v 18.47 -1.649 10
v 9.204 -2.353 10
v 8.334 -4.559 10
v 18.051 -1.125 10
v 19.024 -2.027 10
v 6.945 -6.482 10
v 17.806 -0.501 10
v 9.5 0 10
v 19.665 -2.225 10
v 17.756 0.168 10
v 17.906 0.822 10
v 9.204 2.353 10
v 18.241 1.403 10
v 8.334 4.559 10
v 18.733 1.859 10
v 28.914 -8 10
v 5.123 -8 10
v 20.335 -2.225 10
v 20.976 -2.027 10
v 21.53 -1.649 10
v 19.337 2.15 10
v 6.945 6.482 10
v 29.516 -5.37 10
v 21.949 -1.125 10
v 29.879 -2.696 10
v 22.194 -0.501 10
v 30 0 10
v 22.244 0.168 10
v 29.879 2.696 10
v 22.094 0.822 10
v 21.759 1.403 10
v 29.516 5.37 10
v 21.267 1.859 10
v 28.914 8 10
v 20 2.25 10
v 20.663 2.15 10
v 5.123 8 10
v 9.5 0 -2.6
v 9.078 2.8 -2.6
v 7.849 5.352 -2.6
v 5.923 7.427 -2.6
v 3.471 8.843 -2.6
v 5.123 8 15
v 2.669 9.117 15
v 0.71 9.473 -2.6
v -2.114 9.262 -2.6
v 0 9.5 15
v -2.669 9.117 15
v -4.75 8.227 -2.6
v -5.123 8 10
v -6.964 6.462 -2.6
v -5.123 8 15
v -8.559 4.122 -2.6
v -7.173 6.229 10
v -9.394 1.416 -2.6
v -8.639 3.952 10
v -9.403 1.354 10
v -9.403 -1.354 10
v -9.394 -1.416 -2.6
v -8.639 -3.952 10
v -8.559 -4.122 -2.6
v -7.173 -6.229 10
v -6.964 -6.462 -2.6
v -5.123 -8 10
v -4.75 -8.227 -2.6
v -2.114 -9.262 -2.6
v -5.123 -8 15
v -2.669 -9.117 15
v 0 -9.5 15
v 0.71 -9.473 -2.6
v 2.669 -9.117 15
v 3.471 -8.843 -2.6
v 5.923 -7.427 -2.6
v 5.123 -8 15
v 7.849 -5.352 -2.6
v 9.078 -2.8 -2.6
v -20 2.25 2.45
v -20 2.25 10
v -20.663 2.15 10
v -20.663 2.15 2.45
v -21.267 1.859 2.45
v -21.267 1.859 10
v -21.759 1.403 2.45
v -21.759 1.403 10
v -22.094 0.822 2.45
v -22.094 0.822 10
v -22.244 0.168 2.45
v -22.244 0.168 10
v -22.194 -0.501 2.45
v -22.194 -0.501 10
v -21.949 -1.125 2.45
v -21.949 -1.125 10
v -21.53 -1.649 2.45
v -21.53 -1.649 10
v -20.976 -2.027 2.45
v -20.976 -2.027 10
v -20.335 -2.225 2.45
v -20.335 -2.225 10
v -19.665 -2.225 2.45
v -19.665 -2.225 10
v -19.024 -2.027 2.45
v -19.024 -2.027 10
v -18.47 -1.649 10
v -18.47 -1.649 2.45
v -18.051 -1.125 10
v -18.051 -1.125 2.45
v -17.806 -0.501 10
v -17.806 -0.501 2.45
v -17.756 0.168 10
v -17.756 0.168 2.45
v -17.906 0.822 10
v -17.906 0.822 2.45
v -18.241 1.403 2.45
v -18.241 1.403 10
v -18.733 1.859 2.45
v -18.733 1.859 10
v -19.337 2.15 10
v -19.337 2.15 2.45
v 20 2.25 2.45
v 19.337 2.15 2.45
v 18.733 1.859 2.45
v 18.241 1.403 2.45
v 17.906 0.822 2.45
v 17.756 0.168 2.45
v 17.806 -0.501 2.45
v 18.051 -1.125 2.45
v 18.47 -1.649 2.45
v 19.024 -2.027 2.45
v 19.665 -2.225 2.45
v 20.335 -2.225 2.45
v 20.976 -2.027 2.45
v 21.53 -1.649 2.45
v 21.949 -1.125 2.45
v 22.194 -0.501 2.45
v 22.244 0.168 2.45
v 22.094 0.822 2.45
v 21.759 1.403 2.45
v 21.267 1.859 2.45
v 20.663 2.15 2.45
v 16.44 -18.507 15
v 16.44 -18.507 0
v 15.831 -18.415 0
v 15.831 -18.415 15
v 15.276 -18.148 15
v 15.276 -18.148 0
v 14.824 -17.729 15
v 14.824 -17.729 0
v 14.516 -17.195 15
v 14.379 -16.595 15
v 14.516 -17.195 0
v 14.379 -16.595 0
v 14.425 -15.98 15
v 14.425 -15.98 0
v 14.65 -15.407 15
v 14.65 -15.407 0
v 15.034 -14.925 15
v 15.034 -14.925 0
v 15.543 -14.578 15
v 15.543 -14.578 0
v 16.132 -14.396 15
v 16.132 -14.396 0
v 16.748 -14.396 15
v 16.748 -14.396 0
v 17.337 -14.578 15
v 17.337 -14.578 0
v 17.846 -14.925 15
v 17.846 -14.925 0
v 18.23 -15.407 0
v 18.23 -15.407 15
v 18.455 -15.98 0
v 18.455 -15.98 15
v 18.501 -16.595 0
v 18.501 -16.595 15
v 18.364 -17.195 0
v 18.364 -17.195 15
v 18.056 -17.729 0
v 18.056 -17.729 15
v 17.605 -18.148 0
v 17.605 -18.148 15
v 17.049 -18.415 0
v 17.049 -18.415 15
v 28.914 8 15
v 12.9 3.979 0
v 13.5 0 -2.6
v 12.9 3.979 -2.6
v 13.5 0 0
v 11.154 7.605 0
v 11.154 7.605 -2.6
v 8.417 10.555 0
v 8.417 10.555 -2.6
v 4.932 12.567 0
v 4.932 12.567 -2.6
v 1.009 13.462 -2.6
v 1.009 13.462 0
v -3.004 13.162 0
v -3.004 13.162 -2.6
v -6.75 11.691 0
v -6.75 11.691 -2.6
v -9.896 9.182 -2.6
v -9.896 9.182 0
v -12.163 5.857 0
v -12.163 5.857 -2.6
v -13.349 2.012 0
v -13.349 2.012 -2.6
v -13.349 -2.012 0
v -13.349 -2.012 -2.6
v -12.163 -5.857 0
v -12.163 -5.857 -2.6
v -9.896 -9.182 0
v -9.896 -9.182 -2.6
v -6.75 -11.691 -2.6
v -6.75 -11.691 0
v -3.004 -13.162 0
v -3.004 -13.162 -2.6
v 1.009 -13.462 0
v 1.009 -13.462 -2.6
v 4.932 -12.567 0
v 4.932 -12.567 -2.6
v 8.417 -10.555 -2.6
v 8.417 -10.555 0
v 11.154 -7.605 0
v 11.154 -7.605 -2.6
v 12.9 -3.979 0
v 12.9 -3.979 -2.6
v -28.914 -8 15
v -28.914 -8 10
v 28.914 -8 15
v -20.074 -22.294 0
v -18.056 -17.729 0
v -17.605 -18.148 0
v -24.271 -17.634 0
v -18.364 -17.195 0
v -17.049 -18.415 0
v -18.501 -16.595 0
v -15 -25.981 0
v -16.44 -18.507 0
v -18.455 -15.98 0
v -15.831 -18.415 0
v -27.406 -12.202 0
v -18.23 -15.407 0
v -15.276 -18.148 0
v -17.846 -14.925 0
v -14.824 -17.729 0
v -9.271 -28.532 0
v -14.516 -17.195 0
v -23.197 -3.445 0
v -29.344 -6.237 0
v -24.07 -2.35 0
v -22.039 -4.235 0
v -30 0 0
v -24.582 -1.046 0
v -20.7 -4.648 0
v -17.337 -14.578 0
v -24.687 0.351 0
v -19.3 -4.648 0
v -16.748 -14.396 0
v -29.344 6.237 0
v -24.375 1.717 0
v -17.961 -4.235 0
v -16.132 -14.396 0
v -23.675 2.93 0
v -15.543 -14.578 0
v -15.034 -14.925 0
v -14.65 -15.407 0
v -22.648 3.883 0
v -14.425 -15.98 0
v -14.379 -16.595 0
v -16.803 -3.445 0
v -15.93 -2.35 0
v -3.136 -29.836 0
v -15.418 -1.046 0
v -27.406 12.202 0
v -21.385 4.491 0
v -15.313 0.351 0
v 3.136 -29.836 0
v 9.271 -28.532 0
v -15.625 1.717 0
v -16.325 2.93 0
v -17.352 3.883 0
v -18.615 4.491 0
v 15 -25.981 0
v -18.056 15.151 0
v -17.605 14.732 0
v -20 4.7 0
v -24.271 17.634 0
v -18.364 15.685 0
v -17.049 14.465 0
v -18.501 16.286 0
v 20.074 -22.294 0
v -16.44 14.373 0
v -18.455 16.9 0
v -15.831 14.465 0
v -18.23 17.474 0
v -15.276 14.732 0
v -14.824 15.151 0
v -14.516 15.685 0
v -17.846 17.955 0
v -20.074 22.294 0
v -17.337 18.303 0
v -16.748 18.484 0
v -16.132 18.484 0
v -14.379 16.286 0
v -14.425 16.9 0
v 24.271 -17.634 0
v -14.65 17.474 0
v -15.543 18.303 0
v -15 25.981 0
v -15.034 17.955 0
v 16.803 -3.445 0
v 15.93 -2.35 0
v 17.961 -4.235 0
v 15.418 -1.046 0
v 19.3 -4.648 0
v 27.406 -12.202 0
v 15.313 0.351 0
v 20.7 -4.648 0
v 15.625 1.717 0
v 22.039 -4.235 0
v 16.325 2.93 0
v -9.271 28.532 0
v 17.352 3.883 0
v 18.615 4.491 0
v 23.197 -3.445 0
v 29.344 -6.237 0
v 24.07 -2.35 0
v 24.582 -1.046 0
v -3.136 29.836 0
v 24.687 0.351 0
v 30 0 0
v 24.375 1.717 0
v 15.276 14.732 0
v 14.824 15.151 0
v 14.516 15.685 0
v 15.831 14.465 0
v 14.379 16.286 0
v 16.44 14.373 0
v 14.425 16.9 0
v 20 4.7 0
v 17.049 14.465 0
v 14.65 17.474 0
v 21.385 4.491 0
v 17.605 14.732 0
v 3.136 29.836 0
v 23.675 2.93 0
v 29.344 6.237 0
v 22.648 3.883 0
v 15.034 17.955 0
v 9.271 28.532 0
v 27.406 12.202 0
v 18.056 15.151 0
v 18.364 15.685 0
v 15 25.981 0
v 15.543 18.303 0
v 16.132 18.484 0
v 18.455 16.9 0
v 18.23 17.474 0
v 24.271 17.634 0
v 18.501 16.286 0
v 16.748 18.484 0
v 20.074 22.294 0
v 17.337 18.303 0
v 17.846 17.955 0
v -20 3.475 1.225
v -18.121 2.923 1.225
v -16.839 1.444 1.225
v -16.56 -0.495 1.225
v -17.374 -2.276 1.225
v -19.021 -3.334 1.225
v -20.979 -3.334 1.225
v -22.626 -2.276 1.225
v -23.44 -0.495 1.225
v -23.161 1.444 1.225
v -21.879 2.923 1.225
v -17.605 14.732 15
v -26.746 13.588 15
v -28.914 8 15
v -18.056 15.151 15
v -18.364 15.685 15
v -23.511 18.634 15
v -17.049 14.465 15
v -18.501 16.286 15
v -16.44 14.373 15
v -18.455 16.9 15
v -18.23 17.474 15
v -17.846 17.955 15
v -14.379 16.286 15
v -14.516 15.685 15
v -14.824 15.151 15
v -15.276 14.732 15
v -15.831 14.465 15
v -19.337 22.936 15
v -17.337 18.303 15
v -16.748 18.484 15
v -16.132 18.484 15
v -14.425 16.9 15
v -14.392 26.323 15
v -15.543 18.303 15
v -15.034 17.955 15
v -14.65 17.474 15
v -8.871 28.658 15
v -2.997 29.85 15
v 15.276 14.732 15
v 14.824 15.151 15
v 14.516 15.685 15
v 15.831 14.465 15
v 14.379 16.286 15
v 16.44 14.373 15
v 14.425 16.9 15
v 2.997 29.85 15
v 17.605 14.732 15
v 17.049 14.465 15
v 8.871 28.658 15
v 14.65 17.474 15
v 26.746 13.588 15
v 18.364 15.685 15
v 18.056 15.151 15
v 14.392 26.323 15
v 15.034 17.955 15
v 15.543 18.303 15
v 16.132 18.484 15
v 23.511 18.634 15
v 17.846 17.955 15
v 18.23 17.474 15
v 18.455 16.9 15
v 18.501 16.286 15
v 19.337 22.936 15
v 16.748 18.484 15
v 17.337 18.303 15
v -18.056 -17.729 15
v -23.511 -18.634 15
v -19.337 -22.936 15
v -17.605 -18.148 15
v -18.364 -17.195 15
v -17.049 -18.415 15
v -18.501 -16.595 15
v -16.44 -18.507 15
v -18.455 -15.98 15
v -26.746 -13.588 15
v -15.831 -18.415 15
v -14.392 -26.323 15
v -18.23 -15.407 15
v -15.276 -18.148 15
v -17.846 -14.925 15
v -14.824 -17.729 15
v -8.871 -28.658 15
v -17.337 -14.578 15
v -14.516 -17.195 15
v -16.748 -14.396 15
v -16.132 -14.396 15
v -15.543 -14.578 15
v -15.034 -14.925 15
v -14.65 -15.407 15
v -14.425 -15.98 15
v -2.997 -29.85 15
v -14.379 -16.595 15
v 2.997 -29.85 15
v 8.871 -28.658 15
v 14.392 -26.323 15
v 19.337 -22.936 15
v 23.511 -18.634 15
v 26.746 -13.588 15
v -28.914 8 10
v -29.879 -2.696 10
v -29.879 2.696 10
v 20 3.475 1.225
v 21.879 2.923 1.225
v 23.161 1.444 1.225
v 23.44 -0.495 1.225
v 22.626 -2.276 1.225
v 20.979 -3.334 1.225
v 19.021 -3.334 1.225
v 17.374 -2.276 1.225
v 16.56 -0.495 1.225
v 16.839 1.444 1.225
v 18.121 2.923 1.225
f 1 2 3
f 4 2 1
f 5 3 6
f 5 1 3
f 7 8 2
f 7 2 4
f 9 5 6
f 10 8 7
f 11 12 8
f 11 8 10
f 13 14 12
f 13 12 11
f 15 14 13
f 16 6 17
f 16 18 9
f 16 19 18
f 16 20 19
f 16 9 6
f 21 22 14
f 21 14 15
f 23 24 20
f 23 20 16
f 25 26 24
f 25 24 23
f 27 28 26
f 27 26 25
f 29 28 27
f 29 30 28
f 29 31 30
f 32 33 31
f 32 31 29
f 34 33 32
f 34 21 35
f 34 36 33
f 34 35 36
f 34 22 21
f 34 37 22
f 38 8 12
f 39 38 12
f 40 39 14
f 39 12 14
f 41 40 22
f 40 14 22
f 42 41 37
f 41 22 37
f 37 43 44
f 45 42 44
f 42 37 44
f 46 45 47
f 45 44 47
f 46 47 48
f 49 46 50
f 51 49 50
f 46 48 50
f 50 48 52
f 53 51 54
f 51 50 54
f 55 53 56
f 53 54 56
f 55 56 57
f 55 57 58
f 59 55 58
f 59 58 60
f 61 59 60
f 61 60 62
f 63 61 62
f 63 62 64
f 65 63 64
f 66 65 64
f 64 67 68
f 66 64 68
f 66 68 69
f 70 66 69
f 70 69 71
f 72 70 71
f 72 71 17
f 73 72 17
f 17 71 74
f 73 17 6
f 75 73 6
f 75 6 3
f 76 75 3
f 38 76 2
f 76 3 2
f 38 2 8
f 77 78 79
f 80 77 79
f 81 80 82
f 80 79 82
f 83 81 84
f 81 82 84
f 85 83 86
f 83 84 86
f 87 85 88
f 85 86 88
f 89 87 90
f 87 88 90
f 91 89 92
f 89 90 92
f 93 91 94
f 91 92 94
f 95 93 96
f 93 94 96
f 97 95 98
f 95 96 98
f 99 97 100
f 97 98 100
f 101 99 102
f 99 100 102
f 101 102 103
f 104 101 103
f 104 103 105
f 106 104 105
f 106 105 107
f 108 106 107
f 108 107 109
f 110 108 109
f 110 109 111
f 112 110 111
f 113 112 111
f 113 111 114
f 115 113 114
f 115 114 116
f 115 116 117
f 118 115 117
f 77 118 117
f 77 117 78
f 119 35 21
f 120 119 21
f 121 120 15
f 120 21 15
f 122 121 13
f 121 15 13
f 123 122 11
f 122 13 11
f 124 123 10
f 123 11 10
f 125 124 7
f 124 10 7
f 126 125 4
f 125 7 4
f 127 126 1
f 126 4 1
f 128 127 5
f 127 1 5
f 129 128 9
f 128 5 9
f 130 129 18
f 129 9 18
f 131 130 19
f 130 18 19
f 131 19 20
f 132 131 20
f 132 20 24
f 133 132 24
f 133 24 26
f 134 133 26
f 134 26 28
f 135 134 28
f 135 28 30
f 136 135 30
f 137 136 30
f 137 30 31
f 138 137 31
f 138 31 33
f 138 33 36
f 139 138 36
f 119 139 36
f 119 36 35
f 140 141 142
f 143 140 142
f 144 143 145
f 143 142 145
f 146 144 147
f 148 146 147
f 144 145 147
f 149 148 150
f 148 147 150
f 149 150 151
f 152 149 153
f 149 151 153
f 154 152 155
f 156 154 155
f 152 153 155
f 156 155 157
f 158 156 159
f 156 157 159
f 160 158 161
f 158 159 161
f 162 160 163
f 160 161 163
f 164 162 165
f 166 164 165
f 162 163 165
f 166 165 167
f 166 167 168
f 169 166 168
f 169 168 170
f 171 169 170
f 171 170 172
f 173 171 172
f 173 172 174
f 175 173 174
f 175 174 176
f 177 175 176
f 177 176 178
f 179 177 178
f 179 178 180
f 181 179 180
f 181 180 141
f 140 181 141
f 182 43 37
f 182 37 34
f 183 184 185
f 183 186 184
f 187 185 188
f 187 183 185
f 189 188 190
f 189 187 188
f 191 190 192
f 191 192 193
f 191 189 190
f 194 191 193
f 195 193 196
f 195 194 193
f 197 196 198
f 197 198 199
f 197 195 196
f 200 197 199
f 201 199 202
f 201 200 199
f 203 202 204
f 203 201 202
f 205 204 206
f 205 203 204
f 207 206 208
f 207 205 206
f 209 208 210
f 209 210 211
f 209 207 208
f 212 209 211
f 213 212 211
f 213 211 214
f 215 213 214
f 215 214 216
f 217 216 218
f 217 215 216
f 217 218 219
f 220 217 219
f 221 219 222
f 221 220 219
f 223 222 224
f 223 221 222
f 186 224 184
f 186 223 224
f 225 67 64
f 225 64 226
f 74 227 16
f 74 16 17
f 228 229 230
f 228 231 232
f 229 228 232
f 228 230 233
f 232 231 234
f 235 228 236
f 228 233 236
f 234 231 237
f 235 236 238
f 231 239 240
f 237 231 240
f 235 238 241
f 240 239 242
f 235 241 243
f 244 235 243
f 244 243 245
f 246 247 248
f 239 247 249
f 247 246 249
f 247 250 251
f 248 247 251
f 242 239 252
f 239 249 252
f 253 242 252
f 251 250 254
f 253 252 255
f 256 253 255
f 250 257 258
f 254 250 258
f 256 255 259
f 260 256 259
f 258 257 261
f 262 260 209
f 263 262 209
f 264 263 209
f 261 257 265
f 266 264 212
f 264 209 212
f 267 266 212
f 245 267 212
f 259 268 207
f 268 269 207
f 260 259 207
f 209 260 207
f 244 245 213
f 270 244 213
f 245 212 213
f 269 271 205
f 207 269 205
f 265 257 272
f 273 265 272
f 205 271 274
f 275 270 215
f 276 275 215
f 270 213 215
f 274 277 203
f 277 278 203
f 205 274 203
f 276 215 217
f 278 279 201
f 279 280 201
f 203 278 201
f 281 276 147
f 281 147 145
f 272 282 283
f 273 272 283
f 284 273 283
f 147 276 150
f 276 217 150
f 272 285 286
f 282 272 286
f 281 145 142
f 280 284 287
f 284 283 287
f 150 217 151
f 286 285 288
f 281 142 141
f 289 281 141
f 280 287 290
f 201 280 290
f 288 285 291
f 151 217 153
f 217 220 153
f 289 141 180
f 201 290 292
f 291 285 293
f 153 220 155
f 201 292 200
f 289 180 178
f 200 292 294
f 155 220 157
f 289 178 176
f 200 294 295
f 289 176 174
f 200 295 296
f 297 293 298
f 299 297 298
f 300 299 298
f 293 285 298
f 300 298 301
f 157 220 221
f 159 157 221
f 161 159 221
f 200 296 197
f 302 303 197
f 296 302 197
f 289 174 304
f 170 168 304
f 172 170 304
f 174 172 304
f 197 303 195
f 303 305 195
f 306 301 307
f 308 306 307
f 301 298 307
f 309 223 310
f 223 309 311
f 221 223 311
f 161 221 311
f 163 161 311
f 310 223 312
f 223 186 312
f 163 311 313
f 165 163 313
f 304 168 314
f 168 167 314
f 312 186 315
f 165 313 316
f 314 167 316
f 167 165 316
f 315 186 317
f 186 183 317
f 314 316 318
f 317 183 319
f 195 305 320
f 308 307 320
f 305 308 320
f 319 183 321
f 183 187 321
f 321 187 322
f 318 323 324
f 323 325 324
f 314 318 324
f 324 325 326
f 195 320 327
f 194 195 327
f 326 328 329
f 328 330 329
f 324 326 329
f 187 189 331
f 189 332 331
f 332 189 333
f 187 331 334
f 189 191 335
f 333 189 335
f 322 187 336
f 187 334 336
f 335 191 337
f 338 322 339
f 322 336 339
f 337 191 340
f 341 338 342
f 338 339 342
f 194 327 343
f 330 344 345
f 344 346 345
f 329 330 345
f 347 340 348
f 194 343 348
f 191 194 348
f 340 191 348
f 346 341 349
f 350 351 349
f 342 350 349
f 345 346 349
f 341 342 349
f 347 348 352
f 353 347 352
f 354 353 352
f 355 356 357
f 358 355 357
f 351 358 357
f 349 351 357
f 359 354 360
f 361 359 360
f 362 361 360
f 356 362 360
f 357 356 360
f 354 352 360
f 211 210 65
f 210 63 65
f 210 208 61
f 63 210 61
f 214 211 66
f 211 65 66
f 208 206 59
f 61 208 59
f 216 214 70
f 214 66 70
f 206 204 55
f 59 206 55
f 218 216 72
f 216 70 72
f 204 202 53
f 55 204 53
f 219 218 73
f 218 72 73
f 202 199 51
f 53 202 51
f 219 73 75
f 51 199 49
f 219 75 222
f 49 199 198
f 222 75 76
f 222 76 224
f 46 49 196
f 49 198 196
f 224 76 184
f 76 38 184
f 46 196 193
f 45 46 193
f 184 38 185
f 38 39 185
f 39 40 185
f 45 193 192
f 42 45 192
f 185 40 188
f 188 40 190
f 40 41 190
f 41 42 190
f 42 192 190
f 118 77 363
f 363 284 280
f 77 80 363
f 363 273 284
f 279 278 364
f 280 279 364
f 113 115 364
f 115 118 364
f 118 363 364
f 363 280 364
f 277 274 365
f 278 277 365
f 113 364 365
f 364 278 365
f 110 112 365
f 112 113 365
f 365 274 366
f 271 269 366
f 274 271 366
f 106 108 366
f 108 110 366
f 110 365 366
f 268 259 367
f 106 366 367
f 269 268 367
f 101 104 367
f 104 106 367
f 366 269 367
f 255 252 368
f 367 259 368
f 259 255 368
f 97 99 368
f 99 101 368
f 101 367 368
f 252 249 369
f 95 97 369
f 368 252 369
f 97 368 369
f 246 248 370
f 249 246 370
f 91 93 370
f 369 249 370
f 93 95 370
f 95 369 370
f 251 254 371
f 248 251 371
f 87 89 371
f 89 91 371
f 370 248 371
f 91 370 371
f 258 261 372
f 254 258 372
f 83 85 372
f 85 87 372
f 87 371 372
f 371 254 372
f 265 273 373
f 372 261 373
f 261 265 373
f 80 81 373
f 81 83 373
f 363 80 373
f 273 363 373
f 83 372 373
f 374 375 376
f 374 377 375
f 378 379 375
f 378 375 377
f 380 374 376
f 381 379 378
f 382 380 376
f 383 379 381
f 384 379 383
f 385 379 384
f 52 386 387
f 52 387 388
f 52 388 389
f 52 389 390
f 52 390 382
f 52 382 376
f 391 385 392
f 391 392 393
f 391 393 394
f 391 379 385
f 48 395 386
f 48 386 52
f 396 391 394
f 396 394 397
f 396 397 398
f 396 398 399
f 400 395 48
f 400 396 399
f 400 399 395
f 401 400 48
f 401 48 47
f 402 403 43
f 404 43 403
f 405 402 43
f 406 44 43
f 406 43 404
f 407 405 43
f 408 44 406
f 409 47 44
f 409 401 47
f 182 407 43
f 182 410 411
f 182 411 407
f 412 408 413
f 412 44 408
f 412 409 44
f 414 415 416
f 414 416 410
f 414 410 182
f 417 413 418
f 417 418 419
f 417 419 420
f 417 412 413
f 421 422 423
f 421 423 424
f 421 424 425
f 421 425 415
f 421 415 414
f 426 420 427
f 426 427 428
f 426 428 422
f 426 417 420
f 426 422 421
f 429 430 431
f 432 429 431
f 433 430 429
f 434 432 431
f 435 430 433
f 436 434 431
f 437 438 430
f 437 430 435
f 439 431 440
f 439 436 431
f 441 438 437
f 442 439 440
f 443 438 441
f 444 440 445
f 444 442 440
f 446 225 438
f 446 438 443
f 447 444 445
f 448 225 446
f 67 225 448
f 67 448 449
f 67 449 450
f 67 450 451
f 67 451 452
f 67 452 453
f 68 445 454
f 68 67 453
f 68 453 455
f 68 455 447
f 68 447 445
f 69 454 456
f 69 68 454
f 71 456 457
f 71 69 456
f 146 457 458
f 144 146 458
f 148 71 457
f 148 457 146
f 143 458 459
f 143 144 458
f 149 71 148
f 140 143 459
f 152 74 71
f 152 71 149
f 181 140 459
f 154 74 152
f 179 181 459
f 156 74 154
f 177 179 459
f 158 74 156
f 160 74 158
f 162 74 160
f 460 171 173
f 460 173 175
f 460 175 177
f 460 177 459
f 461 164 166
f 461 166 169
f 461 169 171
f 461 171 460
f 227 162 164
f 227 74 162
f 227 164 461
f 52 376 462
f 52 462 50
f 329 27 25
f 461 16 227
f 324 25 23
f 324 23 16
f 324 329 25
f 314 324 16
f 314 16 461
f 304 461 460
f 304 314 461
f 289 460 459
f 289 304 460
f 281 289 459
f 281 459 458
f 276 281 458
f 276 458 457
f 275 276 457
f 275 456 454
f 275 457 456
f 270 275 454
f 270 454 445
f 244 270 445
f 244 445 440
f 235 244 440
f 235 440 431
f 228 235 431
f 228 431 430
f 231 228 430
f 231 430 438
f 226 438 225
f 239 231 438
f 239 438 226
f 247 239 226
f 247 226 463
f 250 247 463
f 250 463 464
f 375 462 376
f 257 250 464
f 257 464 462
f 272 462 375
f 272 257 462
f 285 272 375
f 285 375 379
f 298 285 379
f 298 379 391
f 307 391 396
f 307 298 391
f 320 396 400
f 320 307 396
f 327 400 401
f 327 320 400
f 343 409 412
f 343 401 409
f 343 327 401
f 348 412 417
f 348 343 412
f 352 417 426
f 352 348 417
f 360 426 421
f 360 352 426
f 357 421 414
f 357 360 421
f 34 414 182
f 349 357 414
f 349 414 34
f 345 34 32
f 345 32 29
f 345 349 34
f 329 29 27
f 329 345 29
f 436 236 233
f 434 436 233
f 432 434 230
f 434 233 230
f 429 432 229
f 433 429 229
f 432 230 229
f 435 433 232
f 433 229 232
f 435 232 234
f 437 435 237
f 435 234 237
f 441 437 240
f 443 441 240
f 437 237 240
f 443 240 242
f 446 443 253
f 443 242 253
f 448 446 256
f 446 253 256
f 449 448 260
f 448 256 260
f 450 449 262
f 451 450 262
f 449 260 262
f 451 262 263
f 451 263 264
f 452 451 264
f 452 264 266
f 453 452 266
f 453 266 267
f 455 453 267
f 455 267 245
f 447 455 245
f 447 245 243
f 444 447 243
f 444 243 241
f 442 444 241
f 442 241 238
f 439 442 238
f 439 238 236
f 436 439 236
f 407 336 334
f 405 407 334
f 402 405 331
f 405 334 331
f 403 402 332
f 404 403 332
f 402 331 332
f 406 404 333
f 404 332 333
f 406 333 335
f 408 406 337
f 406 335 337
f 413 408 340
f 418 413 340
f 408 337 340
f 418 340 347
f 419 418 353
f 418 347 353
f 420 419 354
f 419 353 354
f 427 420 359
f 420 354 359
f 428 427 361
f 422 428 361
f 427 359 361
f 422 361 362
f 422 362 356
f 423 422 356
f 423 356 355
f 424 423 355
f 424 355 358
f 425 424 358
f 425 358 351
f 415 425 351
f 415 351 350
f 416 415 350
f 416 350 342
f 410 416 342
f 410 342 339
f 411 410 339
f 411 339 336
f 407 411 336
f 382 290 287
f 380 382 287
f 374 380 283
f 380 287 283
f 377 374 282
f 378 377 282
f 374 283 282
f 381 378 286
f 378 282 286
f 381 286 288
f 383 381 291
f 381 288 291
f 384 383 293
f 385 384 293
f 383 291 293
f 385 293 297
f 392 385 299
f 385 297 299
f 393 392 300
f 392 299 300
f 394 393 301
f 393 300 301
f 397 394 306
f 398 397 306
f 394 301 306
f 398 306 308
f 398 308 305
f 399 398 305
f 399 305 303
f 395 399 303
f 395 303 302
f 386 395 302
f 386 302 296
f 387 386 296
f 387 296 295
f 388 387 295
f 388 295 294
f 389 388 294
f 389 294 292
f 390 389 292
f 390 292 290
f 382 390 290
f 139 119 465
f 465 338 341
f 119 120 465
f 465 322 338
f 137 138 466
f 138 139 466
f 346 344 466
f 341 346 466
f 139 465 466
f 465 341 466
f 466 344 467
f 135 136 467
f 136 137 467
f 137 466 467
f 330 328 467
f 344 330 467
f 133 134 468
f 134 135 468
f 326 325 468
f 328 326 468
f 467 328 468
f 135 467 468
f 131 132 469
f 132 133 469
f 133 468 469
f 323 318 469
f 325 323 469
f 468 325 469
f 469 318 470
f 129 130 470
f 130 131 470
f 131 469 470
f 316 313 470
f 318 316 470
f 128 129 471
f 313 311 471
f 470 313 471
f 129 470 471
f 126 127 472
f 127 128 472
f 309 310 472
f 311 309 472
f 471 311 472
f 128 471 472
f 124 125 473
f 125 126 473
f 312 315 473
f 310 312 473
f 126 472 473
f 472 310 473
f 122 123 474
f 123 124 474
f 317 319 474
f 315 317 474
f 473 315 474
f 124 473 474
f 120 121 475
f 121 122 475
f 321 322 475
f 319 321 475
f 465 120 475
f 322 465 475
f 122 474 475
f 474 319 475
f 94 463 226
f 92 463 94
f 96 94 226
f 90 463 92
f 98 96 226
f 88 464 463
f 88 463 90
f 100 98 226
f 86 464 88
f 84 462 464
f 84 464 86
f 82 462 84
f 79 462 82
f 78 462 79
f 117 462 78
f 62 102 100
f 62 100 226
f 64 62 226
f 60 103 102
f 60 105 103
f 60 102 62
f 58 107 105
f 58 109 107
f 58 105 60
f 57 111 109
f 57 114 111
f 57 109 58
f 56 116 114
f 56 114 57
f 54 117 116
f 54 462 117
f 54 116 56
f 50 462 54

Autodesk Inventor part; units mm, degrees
ref_plane "Arbeitsebene3" through (0, 0, 50) normal (0, 0, 1) x (1, 0, 0)
ref_plane "Arbeitsebene4" through (0, 0, 130) normal (0, 0, 1) x (1, 0, 0)
sketch "Skizze1" plane through (0, 0, 0) normal (0, 0, 1) x (1, 0, 0)
  circle A0 centre (0, 0) radius 30
  circle A1 centre (0, 0) radius 13.5
  circle A2 centre (0, 0) radius 9.5
  circle A3 centre (0, 0) radius 23.25 construction
  line L0 (0, 0) -> (16.4402, 16.4402) construction
  line L1 (0, 0) -> (0, 30) construction
  point P0 (-16.4402, 16.4402)
  point P1 (-16.4402, -16.4402)
  point P2 (16.4402, -16.4402)
  dimension "d3" = 30
  dimension "d4" = 46.5
  dimension "d0" = 4
  dimension "d1" = 27
  dimension "d7" = 360
  dimension "d99" = 45
extrude "Extrusion1" add sketch "Skizze1" along normal blind 15 contours A0 | A1
extrude "Extrusion2" add sketch "Skizze1" against normal blind 2.6 contours A1
sketch "Skizze2" plane through (0, 0, 15) normal (0, 0, 1) x (1, 0, 0)
  point P0 (0, 0)
  point P1 (16.4402, 16.4402)
  point P2 (16.4402, -16.4402)
  point P3 (-16.4402, -16.4402)
  point P4 (-16.4402, 16.4402)
hole "Bohrung1" at (16.4402, 16.4402, 15) at (16.4402, -16.4402, 15) at (-16.4402, -16.4402, 15) at (-16.4402, 16.4402, 15) direction (0, 0, -1) diameter 4.134 end through all thread size "M5x0.8" class "6H" standard "ISO Metric profile"
ref_plane "Arbeitsebene1" through (0, 0, 10) normal (0, 0, 1) x (1, 0, 0)
sketch "Skizze10" plane through (0, 0, 15) normal (0, 0, 1) x (1, 0, 0)
  line L0 (-30, 8) -> (30, 8)
  line L1 (30, 8) -> (30, -8)
  line L2 (30, -8) -> (-30, -8)
  line L3 (-30, -8) -> (-30, 8)
  line L4 (-30, 8) -> (30, -8) construction
  line L5 (30, 8) -> (-30, -8) construction
  circle A0 centre (0, 0) radius 30 projected
  circle A1 centre (-16.4402, 16.4402) radius 2.067 construction
  circle A2 centre (-16.4402, -16.4402) radius 2.067 construction
  line L6 (-20, 0) -> (20, 0) construction
  circle A3 centre (0, 0) radius 30 projected
  line L7 (0, 42) -> (0, -42) construction
  point P0 (-28.9137, 8)
  point P1 (-28.9137, -8)
  point P2 (28.9137, -8)
  point P3 (28.9137, 8)
  point P4 (30, 0)
  point P5 (-30, 0)
  dimension "d81" = 16
  dimension "d82" = 40
extrude "Extrusion7" cut sketch "Skizze10" against normal blind 5 contours L0 A0 L3 | L0 A0 L2 | A0 L2 L3 | L0 L1 A0 | L1 L2 A0
sketch "Skizze11" plane through (0, 0, 0) normal (0, 0, -1) x (-1, 0, 0)
  point P0 (0, 0)
  point P1 (-20, 0)
  point P2 (20, 0)
hole "Bohrung4" at (20, 0, 0) at (-20, 0, 0) direction (0, 0, 1) diameter 4.5 end through all countersink diameter 9.4 countersink angle 90 clearance for "Senkschraube mit Linsenkopf ISO 2010" size "M4" standard "DIN"
sketch "Skizze4" plane through (0, 0, 0) normal (1, 0, 0) x (0, 1, 0)
  line L0 (9.5, -2.6) -> (-9.5, -2.6) construction
  line L1 (0, 192.52) -> (0, -35.12) construction
  line L2 (-9.5, 15) -> (-9.5, -2.6) construction
  line L3 (9.5, 15) -> (9.5, -2.6) construction
  line L4 (-9.5, 15) -> (9.5, 15) construction
  line L5 (-9.5, 2.4) -> (9.5, 2.4)
  line L6 (-9.5, 2.4) -> (-9.5, 15)
  line L7 (-9.5, 15) -> (-20, 15)
  line L8 (-20, 15) -> (-20, 165)
  line L9 (-20, 165) -> (20, 165)
  line L10 (20, 15) -> (9.5, 15)
  line L11 (9.5, 15) -> (9.5, 2.4)
  line L12 (20, 165) -> (20, 15)
  line L13 (0, 2.4) -> (0, 165)
  point P0 (0, 0)
  dimension "d27" = 5
  dimension "d31" = 150
  dimension "d33" = 40
  dimension "MainAxis_Schluesselweite" = 24
  dimension "d46" = 1
  dimension "d52" = 32
  dimension "Flansch_ParralelMech_FlatPart_Width" = 140
sketch "Skizze7" plane through (0, 0, 50) normal (0, 0, 1) x (1, 0, 0)
  line L0 (-12, 16) -> (-12, -16) construction
  line L1 (-12, 15) -> (-3, 15)
  line L2 (-3, 15) -> (-3, 11.425)
  line L3 (-3, 11.425) -> (3, 11.425)
  line L4 (3, 11.425) -> (3, 15)
  line L5 (3, 15) -> (12, 15)
  line L6 (-12, 0) -> (-12, 15)
  line L7 (0, -16) -> (0, 16) construction
  line L8 (12, -16) -> (12, 16) construction
  line L9 (12, 15) -> (12, 0)
  line L10 (-12, 0) -> (12, 0)
  line L11 (-42, 0) -> (42, 0) construction
  point P0 (0, 11.425)
  point P1 (-12, -7.2111)
  point P2 (12, 7.2111)
  dimension "d51" = 9
  dimension "d63" = 30
  dimension "d64" = 22.85
sketch "Skizze8" plane through (12, -16, 160) normal (1, 0, 0) x (0, 0, -1)
  line L0 (30, -26) -> (30, 58) construction
  line L1 (-32.52, 16) -> (195.12, 16) construction
  point P0 (160, 16)
  point P1 (30, 16)
equation "\"d3\" = Flansch_FemalePart_OuterDia"
equation "\"d4\" = Flansch_FemalePart_HoleDia"
equation "\"d1\" = Flansch_Klemmdeckelausnahme_Dia"
equation "\"d33\" = d28"
equation "\"Total_Bearing_Hole_Dist\" = 80"
equation "\"Flansch_FemalePart_OuterDia\" = 30"
equation "\"Flansch_FemalePart_HoleDia\" = 46.5"
equation "\"Flansch_Klemmdeckelausnahme_Dia\" = 27"
equation "\"d28\" = 40"
properties part number "Flansch_FemalePart_MainAxis_HeadConnectorBase_V2" material "Edelstahl"
